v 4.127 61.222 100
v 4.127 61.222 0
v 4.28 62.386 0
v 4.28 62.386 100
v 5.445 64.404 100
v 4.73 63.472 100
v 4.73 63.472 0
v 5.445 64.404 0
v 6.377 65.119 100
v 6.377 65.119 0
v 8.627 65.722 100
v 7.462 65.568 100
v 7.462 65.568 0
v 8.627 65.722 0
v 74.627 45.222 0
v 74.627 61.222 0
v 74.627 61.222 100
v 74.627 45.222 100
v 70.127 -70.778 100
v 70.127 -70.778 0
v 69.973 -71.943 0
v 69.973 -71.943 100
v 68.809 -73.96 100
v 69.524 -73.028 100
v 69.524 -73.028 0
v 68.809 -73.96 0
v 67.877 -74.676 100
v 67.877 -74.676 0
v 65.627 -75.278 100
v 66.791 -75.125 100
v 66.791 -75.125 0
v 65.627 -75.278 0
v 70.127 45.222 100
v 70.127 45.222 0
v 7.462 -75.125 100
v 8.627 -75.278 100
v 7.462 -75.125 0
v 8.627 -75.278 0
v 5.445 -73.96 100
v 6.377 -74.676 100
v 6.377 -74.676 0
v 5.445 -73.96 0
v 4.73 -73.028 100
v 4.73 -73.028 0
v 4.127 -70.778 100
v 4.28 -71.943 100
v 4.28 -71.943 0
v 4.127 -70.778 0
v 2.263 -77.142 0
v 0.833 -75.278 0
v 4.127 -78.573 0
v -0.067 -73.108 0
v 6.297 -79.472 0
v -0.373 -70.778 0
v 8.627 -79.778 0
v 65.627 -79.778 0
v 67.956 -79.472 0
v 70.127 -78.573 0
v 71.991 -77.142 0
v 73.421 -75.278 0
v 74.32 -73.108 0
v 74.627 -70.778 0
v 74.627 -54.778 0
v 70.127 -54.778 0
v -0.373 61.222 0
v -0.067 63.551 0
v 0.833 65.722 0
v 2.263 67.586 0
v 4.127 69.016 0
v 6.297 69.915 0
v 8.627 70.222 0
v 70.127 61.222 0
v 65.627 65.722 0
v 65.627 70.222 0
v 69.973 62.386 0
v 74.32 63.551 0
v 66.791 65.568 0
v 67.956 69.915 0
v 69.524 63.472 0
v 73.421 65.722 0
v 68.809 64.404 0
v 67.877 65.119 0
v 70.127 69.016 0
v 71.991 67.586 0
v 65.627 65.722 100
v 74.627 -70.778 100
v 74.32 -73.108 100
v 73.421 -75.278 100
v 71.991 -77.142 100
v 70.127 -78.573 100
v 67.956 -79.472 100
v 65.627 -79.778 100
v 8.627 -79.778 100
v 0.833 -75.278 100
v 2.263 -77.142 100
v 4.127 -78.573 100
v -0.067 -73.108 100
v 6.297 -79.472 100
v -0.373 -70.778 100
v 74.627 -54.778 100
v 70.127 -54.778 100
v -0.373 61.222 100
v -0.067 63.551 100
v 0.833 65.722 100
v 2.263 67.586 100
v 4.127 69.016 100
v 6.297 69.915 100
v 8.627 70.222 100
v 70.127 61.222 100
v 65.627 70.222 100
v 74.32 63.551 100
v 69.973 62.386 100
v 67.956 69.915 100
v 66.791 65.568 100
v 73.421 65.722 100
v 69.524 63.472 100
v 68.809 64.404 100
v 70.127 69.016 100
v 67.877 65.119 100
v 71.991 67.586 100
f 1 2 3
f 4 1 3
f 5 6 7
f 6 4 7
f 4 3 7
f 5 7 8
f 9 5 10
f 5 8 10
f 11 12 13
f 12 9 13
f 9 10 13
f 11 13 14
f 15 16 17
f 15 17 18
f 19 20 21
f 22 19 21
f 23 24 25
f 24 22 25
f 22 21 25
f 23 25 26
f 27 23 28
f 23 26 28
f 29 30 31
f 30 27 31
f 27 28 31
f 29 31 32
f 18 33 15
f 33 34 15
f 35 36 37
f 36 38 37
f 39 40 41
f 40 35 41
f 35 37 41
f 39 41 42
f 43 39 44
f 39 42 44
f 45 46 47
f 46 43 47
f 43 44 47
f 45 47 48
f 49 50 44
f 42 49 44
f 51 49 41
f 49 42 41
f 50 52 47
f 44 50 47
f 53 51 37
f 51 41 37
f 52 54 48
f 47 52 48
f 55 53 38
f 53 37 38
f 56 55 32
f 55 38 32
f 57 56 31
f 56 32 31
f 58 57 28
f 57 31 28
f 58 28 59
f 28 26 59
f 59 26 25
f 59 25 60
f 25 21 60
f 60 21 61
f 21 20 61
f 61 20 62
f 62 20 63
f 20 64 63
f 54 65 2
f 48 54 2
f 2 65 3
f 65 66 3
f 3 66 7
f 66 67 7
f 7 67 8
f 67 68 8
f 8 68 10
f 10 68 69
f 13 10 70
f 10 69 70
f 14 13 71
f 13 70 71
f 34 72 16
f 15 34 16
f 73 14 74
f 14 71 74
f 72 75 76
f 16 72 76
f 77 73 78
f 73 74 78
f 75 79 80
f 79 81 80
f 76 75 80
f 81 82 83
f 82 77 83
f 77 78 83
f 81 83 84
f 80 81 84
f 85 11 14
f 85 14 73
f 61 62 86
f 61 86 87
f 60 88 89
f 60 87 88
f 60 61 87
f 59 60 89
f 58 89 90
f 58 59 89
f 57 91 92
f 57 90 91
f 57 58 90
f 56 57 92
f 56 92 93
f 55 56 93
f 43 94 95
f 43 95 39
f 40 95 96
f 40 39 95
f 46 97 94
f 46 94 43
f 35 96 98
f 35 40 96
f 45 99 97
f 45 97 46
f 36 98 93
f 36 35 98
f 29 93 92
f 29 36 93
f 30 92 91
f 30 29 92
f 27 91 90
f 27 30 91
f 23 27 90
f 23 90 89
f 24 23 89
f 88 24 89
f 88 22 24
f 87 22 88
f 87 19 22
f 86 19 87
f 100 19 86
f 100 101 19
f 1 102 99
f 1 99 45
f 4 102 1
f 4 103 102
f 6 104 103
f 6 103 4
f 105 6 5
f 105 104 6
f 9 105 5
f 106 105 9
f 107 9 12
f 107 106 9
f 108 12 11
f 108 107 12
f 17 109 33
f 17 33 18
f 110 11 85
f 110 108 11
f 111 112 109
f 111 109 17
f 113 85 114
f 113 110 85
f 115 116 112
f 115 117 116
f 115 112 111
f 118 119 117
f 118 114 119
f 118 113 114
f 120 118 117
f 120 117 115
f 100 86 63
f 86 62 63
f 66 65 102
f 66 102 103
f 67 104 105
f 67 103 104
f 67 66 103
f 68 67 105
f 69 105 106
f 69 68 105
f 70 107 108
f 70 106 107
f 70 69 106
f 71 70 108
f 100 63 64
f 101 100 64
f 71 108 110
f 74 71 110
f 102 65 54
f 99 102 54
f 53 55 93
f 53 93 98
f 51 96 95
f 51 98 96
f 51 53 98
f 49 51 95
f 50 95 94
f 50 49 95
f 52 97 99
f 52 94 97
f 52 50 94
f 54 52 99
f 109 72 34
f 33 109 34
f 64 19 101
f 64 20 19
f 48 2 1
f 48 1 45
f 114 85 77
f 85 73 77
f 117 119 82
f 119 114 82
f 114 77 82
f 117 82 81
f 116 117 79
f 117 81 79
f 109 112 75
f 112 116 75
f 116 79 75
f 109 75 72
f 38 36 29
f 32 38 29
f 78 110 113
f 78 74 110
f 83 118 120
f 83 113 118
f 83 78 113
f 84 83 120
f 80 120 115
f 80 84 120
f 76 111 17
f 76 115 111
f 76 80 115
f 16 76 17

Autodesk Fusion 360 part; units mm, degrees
sketch "スケッチ1" plane through (0, 0, 0) normal (0, 0, 1) x (1, 0, 0)
  line L0 (65.6268, -79.7784) -> (8.6268, -79.7784)
  line L1 (8.6268, -75.2784) -> (65.6268, -75.2784)
  line L2 (8.6268, 65.7216) -> (65.6268, 65.7216)
  line L3 (8.6268, 70.2216) -> (65.6268, 70.2216)
  line L4 (4.1268, 61.2216) -> (4.1268, -70.7784)
  line L5 (-0.3732, 61.2216) -> (-0.3732, -70.7784)
  arc A0 (-0.3732, -70.7784) -> (8.6268, -79.7784) centre (8.6268, -70.7784) ccw
  arc A1 (4.1268, -70.7784) -> (8.6268, -75.2784) centre (8.6268, -70.7784) ccw
  arc A2 (8.6268, 70.2216) -> (-0.3732, 61.2216) centre (8.6268, 61.2216) ccw
  arc A3 (8.6268, 65.7216) -> (4.1268, 61.2216) centre (8.6268, 61.2216) ccw
  line L6 (70.1268, -70.7784) -> (70.1268, -54.7784)
  line L7 (74.6268, -70.7784) -> (74.6268, -54.7784)
  arc A4 (65.6268, -79.7784) -> (74.6268, -70.7784) centre (65.6268, -70.7784) ccw
  arc A5 (65.6268, -75.2784) -> (70.1268, -70.7784) centre (65.6268, -70.7784) ccw
  line L8 (74.6268, -54.7784) -> (70.1268, -54.7784)
  line L9 (74.6268, 61.2216) -> (74.6268, 45.2216)
  line L10 (70.1268, 61.2216) -> (70.1268, 45.2216)
  line L11 (70.1268, 45.2216) -> (74.6268, 45.2216)
  arc A6 (74.6268, 61.2216) -> (65.6268, 70.2216) centre (65.6268, 61.2216) ccw
  arc A7 (70.1268, 61.2216) -> (65.6268, 65.7216) centre (65.6268, 61.2216) ccw
  point P0 (-0.3732, 70.2216)
extrude "押し出し1" add sketch "スケッチ1" along normal blind 100
